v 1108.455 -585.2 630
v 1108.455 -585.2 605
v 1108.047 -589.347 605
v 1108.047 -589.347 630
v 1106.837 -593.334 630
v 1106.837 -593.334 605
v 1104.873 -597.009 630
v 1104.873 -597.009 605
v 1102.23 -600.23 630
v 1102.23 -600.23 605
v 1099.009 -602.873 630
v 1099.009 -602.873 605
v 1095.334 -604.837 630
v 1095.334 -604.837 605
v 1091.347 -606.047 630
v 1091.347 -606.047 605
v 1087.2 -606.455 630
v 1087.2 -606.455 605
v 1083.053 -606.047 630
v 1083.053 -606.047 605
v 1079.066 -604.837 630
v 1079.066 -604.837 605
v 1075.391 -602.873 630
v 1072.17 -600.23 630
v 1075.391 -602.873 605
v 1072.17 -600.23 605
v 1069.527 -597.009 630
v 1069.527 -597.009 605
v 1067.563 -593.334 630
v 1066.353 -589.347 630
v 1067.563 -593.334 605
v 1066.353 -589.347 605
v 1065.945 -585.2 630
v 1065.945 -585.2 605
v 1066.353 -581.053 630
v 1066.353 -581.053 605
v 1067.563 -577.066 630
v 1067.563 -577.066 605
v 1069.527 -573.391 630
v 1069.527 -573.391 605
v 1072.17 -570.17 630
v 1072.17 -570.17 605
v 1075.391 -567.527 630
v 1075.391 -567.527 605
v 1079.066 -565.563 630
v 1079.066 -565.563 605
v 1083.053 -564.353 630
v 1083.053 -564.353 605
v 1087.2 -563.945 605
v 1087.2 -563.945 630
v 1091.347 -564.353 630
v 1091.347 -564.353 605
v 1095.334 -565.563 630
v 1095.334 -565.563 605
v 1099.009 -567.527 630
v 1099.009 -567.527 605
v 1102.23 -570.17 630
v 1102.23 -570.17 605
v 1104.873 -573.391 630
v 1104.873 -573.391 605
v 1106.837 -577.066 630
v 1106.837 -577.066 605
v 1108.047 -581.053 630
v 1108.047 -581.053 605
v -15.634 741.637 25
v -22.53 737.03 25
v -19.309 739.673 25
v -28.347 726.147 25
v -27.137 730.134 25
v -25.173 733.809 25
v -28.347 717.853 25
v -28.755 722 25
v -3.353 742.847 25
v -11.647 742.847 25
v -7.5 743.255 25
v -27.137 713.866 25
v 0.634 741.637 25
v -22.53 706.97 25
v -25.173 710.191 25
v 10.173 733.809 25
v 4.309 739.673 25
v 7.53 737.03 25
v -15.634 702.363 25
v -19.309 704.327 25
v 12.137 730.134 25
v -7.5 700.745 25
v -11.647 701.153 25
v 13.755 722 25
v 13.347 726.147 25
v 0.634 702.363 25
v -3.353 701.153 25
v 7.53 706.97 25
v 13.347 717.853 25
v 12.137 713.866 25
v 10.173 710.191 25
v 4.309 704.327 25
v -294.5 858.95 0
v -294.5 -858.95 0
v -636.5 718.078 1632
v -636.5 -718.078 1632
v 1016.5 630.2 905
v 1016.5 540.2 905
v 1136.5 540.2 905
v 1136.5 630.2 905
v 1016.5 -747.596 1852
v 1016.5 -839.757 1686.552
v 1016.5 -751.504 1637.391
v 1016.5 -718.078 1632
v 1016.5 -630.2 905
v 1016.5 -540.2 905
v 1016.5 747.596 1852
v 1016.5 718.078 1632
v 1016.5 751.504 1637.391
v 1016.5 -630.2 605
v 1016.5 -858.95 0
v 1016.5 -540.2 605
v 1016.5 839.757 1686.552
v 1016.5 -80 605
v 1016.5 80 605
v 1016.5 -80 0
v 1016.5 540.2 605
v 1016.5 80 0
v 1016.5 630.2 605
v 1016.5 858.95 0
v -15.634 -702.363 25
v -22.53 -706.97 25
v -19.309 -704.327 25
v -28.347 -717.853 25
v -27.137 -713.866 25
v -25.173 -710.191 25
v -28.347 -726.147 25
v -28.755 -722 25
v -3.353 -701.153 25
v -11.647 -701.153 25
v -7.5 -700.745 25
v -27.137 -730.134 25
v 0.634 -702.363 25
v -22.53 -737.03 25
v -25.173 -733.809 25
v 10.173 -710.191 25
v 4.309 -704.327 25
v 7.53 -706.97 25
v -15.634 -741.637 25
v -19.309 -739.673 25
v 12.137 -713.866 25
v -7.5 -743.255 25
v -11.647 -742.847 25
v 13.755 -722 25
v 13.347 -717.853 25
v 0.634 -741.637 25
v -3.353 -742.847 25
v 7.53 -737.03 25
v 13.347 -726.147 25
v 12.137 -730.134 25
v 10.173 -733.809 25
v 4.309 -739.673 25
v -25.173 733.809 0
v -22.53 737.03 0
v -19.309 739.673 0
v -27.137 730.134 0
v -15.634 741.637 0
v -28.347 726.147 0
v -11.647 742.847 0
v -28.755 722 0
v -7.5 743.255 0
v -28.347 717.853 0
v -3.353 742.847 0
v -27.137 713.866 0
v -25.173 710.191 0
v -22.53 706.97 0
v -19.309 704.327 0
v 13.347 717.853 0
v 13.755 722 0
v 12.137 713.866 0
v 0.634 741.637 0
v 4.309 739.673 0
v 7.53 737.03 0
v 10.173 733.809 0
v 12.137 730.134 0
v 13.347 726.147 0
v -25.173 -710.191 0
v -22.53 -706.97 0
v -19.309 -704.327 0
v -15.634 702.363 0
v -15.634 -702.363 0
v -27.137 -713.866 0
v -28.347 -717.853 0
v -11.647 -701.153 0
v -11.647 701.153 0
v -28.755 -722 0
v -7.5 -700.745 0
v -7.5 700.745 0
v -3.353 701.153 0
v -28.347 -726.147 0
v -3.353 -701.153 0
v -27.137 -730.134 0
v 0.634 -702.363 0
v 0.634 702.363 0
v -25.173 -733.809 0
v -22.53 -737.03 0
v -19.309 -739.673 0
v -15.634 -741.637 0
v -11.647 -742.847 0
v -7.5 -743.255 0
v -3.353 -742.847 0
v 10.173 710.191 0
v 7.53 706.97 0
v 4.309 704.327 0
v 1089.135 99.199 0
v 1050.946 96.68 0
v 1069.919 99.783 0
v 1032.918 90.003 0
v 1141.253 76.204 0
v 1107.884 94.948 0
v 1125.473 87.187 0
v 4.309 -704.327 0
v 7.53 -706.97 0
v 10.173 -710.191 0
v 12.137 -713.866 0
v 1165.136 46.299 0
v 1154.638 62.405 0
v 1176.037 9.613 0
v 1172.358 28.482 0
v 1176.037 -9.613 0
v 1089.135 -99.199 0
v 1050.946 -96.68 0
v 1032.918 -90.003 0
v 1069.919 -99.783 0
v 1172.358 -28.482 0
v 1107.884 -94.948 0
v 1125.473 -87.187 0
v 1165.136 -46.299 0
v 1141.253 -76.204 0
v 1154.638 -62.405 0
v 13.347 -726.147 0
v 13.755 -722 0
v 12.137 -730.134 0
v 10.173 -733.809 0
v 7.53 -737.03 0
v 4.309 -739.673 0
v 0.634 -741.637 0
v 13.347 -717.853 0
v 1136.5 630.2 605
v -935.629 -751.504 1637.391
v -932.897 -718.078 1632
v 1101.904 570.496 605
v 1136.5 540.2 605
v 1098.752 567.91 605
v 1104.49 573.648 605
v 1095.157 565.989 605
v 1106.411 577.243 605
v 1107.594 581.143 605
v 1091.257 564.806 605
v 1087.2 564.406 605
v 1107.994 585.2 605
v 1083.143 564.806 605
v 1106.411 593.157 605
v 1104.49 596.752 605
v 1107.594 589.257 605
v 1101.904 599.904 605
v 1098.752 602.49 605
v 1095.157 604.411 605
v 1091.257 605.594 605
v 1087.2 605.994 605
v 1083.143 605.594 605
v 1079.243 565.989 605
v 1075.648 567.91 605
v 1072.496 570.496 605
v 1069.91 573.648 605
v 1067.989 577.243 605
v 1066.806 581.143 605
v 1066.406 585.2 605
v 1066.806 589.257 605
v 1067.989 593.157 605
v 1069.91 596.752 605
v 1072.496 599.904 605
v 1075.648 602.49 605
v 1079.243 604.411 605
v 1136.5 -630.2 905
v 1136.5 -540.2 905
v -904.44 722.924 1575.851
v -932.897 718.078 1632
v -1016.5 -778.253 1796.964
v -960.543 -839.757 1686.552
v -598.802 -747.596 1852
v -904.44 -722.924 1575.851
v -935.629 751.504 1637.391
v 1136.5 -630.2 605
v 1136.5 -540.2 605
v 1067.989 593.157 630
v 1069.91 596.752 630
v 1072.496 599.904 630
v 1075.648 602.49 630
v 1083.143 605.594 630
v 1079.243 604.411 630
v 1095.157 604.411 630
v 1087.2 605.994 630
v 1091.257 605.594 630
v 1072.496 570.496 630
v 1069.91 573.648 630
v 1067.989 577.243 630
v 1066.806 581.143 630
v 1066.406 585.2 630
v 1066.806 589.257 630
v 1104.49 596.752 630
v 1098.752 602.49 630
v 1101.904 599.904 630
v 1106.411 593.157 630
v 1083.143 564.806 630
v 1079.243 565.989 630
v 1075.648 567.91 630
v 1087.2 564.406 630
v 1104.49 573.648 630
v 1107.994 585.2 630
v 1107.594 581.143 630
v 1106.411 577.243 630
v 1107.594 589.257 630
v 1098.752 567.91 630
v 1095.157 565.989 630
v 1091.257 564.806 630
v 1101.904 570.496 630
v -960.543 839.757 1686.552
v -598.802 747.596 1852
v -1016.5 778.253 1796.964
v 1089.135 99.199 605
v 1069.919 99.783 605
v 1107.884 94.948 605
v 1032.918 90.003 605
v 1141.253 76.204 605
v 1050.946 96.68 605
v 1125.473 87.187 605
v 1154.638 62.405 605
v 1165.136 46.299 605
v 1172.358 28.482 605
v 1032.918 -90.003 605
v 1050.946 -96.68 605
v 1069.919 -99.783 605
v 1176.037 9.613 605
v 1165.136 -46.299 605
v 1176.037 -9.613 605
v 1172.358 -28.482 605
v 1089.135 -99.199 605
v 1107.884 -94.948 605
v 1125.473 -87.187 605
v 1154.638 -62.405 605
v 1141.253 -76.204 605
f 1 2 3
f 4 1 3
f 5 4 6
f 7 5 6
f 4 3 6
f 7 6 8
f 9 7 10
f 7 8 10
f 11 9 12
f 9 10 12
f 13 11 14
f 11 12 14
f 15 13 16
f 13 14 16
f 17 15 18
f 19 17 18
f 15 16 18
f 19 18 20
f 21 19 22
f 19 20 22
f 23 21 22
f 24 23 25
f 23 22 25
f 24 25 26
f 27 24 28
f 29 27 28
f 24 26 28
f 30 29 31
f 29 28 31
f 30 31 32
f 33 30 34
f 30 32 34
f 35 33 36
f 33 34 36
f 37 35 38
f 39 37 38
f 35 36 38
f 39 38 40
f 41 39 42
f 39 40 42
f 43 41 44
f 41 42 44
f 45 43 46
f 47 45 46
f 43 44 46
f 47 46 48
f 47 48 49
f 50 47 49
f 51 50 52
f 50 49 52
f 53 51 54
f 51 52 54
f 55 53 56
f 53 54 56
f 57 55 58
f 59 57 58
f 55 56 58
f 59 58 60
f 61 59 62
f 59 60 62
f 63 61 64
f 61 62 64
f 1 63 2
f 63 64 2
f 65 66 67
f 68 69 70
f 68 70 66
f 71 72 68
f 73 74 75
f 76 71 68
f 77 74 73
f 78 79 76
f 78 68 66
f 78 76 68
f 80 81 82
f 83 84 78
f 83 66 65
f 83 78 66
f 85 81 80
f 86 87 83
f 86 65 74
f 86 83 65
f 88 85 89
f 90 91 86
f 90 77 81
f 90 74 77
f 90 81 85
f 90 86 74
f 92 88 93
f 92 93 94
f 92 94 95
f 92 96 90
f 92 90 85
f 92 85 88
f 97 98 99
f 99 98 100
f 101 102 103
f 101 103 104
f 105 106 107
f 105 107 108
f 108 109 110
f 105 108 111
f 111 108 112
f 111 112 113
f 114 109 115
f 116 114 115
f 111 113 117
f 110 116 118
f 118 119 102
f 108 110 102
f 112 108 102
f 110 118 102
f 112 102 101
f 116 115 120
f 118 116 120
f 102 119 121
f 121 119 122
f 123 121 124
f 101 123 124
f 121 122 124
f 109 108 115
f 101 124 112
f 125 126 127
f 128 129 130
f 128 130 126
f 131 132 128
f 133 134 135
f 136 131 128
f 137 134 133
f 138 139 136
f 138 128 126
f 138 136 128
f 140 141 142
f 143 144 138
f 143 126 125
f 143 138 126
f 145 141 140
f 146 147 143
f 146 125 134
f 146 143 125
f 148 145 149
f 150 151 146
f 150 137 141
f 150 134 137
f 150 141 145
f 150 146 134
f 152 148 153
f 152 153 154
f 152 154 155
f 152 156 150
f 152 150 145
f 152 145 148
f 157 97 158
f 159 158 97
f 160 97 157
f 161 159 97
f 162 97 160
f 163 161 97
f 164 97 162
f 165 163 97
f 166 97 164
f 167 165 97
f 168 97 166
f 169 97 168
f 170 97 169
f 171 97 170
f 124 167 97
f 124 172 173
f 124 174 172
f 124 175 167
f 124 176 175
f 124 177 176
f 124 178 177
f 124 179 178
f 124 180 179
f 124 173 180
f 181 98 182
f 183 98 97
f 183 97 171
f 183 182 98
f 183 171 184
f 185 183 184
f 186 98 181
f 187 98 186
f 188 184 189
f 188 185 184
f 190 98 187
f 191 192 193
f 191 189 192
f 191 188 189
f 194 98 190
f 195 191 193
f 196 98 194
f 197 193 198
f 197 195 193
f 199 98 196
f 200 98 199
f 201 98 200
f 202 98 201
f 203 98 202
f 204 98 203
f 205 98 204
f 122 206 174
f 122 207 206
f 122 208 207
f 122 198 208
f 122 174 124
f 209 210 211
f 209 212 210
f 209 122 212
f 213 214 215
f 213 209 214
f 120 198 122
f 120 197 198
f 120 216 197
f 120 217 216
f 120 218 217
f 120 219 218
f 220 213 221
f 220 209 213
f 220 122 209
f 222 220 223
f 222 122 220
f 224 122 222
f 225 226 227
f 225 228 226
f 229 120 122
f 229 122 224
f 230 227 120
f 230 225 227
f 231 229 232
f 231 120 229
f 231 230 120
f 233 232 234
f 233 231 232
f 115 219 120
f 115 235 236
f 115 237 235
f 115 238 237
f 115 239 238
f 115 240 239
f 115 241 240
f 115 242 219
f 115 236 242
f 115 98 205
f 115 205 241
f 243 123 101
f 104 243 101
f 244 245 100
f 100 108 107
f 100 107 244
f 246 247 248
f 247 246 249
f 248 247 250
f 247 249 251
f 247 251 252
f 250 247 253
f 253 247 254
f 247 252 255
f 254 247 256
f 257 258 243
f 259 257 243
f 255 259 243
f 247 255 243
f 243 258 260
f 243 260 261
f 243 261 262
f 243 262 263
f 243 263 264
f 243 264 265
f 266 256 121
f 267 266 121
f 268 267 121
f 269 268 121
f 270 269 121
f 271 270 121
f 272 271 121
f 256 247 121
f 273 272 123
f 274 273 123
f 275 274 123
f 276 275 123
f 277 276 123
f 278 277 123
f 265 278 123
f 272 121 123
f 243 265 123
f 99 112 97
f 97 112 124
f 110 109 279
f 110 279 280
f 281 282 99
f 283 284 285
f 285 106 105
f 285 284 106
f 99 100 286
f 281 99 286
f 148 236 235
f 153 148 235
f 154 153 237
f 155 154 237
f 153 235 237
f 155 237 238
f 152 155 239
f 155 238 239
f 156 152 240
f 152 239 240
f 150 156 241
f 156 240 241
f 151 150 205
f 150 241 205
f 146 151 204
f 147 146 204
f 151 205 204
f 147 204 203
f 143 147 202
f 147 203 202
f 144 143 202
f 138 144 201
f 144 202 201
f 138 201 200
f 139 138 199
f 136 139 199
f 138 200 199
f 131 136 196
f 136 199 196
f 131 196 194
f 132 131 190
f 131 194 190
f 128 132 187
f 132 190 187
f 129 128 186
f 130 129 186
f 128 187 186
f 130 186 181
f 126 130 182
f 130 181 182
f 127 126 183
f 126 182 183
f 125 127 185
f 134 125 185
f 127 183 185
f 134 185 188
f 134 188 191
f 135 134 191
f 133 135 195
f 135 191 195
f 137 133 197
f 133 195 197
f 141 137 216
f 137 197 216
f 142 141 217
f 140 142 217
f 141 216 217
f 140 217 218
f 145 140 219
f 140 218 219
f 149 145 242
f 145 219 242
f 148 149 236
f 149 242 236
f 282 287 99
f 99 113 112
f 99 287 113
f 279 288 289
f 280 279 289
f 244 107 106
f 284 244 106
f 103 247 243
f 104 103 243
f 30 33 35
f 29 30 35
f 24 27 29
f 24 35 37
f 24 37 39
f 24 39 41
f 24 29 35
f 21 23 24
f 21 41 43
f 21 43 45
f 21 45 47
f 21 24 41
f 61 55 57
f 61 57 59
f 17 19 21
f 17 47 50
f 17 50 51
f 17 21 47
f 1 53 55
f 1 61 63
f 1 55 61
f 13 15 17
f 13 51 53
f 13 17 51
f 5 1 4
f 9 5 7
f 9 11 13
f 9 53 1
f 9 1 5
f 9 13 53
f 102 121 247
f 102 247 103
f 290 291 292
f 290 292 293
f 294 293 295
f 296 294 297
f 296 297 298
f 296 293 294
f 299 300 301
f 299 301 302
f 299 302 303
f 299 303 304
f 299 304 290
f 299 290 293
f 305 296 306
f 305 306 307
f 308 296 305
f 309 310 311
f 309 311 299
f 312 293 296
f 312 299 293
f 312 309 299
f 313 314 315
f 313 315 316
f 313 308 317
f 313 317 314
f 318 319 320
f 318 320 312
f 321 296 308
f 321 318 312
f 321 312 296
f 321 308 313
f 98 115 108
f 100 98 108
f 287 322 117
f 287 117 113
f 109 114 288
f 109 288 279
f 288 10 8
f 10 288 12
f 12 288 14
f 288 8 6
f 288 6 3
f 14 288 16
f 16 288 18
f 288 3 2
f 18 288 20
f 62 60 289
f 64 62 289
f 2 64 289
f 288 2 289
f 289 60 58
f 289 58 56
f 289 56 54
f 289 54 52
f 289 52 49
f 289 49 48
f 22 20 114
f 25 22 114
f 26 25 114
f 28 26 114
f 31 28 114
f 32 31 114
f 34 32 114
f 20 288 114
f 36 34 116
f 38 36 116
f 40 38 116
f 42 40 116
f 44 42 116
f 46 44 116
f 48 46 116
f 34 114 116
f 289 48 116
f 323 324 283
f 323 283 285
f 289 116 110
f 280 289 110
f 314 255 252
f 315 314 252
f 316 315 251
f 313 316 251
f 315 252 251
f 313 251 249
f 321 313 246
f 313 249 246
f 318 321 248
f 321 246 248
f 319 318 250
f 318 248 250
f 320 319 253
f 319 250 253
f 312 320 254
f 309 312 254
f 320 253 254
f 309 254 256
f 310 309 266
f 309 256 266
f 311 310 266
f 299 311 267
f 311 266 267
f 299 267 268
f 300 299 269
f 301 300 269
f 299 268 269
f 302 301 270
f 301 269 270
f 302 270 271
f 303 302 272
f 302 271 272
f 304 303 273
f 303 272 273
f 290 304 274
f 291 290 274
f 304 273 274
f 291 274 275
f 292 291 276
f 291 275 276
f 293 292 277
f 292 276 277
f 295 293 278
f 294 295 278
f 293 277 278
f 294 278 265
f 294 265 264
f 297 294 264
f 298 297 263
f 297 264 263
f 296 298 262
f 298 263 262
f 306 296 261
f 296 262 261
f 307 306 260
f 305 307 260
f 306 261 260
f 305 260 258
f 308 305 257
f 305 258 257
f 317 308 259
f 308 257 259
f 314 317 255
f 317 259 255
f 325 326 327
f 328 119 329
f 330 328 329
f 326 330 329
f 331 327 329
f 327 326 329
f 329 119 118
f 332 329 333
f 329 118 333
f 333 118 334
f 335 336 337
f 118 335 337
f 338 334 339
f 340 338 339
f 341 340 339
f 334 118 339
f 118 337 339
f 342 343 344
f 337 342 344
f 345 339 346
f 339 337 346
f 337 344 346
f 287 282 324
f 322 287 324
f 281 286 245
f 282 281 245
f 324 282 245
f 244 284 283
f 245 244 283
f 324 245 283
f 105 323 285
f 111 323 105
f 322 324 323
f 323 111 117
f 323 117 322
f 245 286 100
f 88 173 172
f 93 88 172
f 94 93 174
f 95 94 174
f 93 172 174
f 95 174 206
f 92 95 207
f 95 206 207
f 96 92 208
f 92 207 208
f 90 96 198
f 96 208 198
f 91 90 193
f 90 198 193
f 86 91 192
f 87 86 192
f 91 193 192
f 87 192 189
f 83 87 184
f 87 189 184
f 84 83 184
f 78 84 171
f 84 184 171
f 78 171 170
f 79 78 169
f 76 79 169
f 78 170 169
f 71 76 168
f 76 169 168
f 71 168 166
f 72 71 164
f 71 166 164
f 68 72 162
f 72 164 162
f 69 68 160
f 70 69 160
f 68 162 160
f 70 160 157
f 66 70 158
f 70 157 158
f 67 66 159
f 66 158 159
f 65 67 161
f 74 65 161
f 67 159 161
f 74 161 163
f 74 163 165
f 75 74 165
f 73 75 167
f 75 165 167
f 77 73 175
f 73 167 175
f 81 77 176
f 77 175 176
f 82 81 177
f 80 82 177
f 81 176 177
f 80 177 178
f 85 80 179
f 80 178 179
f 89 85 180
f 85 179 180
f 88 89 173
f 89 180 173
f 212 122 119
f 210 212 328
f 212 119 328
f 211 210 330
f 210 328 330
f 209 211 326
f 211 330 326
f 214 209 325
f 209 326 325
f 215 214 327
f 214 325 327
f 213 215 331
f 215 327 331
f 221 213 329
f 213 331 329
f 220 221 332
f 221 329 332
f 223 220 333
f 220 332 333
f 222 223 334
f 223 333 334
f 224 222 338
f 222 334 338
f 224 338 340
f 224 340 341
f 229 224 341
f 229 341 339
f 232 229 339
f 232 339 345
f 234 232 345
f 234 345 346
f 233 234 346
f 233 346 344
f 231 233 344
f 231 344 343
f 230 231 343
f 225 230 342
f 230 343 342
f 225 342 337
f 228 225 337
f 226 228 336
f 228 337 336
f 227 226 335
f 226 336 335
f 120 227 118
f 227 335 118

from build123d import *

# Parameters (mm, degrees)
F0_W      = 2033
F0_H      = 1717.9
F1_DEPTH  = 1852
F3_DEPTH  = 1717.901
F5_DEPTH  = 2033.001
F6_W      = 90
F6_H      = 300
F7_DEPTH  = 120
F8_R      = 20.793928
F8_R_2    = 21.25528
F9_DEPTH  = 25
F10_R     = 21.25528
F11_DEPTH = 25
F12_R     = 100
F13_DEPTH = 605


with BuildPart() as f1:
    # F0 (on Top) → F1 (new body)
    with BuildSketch(Plane.XY):
        Rectangle(F0_W, F0_H)
    extrude(amount=F1_DEPTH)

    # F2 (on face) → F3 (cut, through all)
    with BuildSketch(Plane.XZ.offset(858.95)):
        Polygon((-1016.5, 0), (-294.5, 0), (-636.5, 1632), (-904.440161, 1575.850775), (-1016.5, 1796.963811), align=None)
        Polygon((-1016.5, 1852), (-1016.5, 1796.963811), (-598.801792, 1852), align=None)
    extrude(amount=-F3_DEPTH, mode=Mode.SUBTRACT)

    # F4 (on face) → F5 (cut, through all)
    with BuildSketch(Plane.YZ.offset(1016.5)):
        Polygon((-858.95, 1852), (-858.95, 0), (-718.077719, 1632), (-751.504011, 1637.391351), (-839.757114, 1686.551592), (-747.596234, 1852), align=None)
        Polygon((718.077719, 1632), (858.95, 0), (858.95, 1852), (747.596234, 1852), (839.757114, 1686.551592), (751.504011, 1637.391351), align=None)
    extrude(amount=-F5_DEPTH, mode=Mode.SUBTRACT)

    # F6 (on face) → F7 (join)
    with BuildSketch(Plane.YZ.offset(1016.5)):
        with Locations((-585.2, 755)):
            Rectangle(F6_W, F6_H)
        with Locations((585.2, 755)):
            Rectangle(F6_W, F6_H)
    extrude(amount=F7_DEPTH)

    # F8 (on face) → F9 (cut)
    with BuildSketch(Plane(origin=(0, 0, 605), x_dir=(1, 0, 0), z_dir=(0, 0, -1))):
        with Locations((1087.2, -585.2)):
            Circle(F8_R)
        with Locations((1087.2, 585.2)):
            Circle(F8_R_2)
    extrude(amount=-F9_DEPTH, mode=Mode.SUBTRACT)

    # F10 (on face) → F11 (cut)
    with BuildSketch(Plane(origin=(0, 0, 0), x_dir=(1, 0, 0), z_dir=(0, 0, -1))):
        with Locations((-7.5, 722)):
            Circle(F10_R)
        with Locations((-7.5, -722)):
            Circle(F10_R)
    extrude(amount=-F11_DEPTH, mode=Mode.SUBTRACT)

    # F12 (on face) → F13 (join, through all)
    with BuildSketch(Plane(origin=(0, 0, 605), x_dir=(1, 0, 0), z_dir=(0, 0, -1))):
        with Locations((1076.5, 0)):
            Circle(F12_R)
    extrude(amount=F13_DEPTH)


solid = f1.part
